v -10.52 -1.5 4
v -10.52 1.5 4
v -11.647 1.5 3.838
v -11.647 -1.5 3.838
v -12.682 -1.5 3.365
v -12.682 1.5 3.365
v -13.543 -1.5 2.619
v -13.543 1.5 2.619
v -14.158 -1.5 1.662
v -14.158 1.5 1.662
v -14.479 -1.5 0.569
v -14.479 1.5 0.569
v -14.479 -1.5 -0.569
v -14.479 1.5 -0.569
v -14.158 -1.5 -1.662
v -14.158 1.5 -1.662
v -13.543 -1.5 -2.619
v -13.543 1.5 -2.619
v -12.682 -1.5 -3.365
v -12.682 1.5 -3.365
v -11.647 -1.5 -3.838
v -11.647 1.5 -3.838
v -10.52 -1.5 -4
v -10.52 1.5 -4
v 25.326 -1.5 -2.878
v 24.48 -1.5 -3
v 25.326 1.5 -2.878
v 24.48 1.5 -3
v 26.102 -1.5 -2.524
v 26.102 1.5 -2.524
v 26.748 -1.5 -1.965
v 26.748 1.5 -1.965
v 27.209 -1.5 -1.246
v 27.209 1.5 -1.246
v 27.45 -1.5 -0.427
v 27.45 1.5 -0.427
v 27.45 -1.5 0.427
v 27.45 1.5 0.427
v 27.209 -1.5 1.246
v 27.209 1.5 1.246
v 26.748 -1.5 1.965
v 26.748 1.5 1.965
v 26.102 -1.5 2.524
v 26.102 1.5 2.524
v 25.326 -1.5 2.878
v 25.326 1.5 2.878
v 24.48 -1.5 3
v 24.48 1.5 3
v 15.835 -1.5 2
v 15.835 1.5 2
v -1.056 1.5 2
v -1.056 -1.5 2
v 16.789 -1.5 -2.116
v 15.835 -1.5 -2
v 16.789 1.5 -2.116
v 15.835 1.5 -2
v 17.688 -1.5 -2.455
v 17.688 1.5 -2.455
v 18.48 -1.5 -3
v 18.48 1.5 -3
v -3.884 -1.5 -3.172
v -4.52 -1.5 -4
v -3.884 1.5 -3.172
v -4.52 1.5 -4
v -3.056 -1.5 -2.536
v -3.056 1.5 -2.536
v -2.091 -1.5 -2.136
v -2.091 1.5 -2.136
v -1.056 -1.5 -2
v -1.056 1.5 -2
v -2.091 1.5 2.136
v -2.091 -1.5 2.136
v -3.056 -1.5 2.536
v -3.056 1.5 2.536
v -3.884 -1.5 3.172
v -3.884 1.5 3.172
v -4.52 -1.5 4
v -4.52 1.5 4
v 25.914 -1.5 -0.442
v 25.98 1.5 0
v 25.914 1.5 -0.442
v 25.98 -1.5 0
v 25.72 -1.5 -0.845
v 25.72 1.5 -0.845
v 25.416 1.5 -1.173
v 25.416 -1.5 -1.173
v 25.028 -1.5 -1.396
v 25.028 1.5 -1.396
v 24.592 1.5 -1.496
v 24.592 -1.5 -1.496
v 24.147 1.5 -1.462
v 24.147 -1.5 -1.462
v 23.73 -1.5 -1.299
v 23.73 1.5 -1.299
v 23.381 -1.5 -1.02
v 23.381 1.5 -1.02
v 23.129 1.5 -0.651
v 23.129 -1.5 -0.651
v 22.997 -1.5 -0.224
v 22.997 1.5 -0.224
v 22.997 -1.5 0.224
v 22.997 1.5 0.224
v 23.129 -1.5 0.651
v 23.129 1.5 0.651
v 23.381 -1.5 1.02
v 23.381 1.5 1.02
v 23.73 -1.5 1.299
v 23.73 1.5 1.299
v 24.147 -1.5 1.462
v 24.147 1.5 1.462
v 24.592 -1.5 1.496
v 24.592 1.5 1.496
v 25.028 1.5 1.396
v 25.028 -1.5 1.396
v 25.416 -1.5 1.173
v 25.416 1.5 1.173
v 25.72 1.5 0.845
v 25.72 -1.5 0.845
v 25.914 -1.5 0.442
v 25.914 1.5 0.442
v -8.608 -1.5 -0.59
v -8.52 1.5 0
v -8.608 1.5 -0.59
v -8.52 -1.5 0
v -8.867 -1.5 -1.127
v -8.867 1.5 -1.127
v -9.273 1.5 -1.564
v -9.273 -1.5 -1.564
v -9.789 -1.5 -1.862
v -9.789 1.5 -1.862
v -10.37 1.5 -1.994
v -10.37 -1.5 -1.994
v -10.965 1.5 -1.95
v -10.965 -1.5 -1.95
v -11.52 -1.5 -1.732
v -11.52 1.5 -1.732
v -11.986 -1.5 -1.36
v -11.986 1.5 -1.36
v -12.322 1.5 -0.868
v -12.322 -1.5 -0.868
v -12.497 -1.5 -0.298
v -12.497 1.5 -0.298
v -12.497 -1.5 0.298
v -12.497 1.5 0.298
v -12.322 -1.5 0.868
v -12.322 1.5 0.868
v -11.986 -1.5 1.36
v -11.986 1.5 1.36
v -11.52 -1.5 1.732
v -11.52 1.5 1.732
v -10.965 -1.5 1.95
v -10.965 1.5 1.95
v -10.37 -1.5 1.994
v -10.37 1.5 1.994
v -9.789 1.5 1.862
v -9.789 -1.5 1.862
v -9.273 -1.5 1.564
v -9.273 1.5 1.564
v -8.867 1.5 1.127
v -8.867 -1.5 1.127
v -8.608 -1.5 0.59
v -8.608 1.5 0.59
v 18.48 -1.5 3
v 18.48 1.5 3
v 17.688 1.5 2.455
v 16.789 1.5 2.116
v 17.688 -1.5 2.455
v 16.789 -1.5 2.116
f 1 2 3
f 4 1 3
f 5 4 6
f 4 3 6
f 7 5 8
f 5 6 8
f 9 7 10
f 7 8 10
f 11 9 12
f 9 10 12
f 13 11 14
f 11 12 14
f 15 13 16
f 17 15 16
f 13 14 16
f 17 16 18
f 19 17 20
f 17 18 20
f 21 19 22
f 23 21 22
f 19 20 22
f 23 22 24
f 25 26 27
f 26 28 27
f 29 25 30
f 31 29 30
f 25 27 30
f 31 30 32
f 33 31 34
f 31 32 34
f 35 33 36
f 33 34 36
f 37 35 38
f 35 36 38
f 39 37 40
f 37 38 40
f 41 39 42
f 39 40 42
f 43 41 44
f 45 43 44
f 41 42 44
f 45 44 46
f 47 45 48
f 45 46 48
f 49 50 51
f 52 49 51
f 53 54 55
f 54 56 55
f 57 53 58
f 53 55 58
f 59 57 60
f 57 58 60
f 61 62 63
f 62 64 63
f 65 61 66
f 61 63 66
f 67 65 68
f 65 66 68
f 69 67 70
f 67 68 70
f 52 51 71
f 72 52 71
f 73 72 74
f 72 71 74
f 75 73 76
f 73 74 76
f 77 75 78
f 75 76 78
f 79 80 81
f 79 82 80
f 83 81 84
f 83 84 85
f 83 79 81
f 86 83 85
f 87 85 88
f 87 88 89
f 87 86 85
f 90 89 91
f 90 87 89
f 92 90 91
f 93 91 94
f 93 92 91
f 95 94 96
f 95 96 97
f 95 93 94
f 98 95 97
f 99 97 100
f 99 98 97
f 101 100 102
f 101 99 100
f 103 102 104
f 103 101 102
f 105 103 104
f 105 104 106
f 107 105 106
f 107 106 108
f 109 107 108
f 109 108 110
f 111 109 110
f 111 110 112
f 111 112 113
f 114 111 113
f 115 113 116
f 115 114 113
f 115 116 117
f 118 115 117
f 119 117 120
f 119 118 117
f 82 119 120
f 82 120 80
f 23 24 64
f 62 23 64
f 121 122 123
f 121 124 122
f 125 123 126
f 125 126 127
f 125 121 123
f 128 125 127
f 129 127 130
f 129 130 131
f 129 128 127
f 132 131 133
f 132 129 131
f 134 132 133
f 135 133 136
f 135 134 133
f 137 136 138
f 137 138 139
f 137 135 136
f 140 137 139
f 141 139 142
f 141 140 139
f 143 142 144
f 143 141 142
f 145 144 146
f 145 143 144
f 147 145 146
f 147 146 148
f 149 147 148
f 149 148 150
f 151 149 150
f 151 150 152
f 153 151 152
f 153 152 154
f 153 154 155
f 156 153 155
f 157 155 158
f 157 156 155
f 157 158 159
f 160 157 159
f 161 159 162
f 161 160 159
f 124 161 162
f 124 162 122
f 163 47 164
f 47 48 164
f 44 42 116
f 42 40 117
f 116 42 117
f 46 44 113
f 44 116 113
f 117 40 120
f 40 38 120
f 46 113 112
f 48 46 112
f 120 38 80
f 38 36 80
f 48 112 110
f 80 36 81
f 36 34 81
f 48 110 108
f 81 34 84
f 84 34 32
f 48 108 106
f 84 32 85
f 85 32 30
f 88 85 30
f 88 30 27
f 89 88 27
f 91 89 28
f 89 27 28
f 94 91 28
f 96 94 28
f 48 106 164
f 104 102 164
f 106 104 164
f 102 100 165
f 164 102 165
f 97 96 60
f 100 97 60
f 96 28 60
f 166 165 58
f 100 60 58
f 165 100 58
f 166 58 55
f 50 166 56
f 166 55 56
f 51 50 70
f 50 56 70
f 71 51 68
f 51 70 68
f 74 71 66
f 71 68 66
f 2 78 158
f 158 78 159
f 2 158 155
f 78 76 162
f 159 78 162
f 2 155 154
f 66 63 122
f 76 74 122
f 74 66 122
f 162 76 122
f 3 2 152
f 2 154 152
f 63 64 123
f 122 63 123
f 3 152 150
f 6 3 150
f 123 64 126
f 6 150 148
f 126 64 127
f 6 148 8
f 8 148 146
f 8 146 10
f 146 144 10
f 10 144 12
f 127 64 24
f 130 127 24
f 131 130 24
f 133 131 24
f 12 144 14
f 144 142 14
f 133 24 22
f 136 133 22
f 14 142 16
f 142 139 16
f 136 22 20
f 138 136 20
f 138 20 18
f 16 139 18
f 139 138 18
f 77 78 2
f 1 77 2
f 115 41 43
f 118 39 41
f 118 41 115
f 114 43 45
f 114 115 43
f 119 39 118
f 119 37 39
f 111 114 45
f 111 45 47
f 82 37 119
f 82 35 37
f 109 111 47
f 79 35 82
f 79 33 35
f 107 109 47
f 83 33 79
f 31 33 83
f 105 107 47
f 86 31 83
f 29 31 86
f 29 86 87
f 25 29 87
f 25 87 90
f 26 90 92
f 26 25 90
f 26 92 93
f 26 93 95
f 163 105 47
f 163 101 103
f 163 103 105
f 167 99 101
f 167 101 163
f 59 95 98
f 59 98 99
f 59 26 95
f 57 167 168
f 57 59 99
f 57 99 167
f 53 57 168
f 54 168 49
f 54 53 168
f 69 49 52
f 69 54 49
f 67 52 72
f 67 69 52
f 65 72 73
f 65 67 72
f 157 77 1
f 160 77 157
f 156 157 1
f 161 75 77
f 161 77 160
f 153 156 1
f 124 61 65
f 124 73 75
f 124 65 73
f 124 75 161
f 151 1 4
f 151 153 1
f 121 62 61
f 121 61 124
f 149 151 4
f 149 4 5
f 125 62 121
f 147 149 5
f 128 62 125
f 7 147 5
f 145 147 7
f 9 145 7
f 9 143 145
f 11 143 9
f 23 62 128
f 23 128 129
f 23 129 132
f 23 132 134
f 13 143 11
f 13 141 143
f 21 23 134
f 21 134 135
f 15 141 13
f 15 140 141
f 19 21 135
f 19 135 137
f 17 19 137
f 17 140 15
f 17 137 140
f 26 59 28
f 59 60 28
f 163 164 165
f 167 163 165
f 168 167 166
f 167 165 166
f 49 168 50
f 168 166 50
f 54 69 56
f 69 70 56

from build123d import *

# Parameters (mm, degrees)
SKETCH1_R           = 2
SKETCH1_R_2         = 1.5
BOSS_EXTRUDE1_DEPTH = 1.5


with BuildPart() as part:
    # Sketch1 → Boss-Extrude1 (new body, symmetric)
    with BuildSketch(Plane(origin=(0, 0, 0), x_dir=(1, 0, 0), z_dir=(0, 1, 0))):
        with BuildLine():
            Line((-10.519623347, 4), (-4.519623347, 4))
            ThreePointArc((-4.519623347, 4), (-3.055521732, 2.535898385), (-1.055521732, 2))
            Line((-1.055521732, 2), (15.834625342, 2))
            ThreePointArc((15.834625342, 2), (17.248838905, 2.258342613), (18.480376653, 3))
            Line((18.480376653, 3), (24.480376653, 3))
            ThreePointArc((24.480376653, 3), (27.480376653, 0), (24.480376653, -3))
            Line((24.480376653, -3), (18.480376653, -3))
            ThreePointArc((18.480376653, -3), (17.248838905, -2.258342613), (15.834625342, -2))
            Line((15.834625342, -2), (-1.055521732, -2))
            ThreePointArc((-1.055521732, -2), (-3.055521732, -2.535898385), (-4.519623347, -4))
            Line((-4.519623347, -4), (-10.519623347, -4))
            ThreePointArc((-10.519623347, -4), (-14.519623347, 0), (-10.519623347, 4))
        make_face()
        with Locations((-10.519623347, 0)):
            Circle(SKETCH1_R, mode=Mode.SUBTRACT)
        with Locations((24.480376653, 0)):
            Circle(SKETCH1_R_2, mode=Mode.SUBTRACT)
    extrude(amount=BOSS_EXTRUDE1_DEPTH, both=True)


solid = part.part
